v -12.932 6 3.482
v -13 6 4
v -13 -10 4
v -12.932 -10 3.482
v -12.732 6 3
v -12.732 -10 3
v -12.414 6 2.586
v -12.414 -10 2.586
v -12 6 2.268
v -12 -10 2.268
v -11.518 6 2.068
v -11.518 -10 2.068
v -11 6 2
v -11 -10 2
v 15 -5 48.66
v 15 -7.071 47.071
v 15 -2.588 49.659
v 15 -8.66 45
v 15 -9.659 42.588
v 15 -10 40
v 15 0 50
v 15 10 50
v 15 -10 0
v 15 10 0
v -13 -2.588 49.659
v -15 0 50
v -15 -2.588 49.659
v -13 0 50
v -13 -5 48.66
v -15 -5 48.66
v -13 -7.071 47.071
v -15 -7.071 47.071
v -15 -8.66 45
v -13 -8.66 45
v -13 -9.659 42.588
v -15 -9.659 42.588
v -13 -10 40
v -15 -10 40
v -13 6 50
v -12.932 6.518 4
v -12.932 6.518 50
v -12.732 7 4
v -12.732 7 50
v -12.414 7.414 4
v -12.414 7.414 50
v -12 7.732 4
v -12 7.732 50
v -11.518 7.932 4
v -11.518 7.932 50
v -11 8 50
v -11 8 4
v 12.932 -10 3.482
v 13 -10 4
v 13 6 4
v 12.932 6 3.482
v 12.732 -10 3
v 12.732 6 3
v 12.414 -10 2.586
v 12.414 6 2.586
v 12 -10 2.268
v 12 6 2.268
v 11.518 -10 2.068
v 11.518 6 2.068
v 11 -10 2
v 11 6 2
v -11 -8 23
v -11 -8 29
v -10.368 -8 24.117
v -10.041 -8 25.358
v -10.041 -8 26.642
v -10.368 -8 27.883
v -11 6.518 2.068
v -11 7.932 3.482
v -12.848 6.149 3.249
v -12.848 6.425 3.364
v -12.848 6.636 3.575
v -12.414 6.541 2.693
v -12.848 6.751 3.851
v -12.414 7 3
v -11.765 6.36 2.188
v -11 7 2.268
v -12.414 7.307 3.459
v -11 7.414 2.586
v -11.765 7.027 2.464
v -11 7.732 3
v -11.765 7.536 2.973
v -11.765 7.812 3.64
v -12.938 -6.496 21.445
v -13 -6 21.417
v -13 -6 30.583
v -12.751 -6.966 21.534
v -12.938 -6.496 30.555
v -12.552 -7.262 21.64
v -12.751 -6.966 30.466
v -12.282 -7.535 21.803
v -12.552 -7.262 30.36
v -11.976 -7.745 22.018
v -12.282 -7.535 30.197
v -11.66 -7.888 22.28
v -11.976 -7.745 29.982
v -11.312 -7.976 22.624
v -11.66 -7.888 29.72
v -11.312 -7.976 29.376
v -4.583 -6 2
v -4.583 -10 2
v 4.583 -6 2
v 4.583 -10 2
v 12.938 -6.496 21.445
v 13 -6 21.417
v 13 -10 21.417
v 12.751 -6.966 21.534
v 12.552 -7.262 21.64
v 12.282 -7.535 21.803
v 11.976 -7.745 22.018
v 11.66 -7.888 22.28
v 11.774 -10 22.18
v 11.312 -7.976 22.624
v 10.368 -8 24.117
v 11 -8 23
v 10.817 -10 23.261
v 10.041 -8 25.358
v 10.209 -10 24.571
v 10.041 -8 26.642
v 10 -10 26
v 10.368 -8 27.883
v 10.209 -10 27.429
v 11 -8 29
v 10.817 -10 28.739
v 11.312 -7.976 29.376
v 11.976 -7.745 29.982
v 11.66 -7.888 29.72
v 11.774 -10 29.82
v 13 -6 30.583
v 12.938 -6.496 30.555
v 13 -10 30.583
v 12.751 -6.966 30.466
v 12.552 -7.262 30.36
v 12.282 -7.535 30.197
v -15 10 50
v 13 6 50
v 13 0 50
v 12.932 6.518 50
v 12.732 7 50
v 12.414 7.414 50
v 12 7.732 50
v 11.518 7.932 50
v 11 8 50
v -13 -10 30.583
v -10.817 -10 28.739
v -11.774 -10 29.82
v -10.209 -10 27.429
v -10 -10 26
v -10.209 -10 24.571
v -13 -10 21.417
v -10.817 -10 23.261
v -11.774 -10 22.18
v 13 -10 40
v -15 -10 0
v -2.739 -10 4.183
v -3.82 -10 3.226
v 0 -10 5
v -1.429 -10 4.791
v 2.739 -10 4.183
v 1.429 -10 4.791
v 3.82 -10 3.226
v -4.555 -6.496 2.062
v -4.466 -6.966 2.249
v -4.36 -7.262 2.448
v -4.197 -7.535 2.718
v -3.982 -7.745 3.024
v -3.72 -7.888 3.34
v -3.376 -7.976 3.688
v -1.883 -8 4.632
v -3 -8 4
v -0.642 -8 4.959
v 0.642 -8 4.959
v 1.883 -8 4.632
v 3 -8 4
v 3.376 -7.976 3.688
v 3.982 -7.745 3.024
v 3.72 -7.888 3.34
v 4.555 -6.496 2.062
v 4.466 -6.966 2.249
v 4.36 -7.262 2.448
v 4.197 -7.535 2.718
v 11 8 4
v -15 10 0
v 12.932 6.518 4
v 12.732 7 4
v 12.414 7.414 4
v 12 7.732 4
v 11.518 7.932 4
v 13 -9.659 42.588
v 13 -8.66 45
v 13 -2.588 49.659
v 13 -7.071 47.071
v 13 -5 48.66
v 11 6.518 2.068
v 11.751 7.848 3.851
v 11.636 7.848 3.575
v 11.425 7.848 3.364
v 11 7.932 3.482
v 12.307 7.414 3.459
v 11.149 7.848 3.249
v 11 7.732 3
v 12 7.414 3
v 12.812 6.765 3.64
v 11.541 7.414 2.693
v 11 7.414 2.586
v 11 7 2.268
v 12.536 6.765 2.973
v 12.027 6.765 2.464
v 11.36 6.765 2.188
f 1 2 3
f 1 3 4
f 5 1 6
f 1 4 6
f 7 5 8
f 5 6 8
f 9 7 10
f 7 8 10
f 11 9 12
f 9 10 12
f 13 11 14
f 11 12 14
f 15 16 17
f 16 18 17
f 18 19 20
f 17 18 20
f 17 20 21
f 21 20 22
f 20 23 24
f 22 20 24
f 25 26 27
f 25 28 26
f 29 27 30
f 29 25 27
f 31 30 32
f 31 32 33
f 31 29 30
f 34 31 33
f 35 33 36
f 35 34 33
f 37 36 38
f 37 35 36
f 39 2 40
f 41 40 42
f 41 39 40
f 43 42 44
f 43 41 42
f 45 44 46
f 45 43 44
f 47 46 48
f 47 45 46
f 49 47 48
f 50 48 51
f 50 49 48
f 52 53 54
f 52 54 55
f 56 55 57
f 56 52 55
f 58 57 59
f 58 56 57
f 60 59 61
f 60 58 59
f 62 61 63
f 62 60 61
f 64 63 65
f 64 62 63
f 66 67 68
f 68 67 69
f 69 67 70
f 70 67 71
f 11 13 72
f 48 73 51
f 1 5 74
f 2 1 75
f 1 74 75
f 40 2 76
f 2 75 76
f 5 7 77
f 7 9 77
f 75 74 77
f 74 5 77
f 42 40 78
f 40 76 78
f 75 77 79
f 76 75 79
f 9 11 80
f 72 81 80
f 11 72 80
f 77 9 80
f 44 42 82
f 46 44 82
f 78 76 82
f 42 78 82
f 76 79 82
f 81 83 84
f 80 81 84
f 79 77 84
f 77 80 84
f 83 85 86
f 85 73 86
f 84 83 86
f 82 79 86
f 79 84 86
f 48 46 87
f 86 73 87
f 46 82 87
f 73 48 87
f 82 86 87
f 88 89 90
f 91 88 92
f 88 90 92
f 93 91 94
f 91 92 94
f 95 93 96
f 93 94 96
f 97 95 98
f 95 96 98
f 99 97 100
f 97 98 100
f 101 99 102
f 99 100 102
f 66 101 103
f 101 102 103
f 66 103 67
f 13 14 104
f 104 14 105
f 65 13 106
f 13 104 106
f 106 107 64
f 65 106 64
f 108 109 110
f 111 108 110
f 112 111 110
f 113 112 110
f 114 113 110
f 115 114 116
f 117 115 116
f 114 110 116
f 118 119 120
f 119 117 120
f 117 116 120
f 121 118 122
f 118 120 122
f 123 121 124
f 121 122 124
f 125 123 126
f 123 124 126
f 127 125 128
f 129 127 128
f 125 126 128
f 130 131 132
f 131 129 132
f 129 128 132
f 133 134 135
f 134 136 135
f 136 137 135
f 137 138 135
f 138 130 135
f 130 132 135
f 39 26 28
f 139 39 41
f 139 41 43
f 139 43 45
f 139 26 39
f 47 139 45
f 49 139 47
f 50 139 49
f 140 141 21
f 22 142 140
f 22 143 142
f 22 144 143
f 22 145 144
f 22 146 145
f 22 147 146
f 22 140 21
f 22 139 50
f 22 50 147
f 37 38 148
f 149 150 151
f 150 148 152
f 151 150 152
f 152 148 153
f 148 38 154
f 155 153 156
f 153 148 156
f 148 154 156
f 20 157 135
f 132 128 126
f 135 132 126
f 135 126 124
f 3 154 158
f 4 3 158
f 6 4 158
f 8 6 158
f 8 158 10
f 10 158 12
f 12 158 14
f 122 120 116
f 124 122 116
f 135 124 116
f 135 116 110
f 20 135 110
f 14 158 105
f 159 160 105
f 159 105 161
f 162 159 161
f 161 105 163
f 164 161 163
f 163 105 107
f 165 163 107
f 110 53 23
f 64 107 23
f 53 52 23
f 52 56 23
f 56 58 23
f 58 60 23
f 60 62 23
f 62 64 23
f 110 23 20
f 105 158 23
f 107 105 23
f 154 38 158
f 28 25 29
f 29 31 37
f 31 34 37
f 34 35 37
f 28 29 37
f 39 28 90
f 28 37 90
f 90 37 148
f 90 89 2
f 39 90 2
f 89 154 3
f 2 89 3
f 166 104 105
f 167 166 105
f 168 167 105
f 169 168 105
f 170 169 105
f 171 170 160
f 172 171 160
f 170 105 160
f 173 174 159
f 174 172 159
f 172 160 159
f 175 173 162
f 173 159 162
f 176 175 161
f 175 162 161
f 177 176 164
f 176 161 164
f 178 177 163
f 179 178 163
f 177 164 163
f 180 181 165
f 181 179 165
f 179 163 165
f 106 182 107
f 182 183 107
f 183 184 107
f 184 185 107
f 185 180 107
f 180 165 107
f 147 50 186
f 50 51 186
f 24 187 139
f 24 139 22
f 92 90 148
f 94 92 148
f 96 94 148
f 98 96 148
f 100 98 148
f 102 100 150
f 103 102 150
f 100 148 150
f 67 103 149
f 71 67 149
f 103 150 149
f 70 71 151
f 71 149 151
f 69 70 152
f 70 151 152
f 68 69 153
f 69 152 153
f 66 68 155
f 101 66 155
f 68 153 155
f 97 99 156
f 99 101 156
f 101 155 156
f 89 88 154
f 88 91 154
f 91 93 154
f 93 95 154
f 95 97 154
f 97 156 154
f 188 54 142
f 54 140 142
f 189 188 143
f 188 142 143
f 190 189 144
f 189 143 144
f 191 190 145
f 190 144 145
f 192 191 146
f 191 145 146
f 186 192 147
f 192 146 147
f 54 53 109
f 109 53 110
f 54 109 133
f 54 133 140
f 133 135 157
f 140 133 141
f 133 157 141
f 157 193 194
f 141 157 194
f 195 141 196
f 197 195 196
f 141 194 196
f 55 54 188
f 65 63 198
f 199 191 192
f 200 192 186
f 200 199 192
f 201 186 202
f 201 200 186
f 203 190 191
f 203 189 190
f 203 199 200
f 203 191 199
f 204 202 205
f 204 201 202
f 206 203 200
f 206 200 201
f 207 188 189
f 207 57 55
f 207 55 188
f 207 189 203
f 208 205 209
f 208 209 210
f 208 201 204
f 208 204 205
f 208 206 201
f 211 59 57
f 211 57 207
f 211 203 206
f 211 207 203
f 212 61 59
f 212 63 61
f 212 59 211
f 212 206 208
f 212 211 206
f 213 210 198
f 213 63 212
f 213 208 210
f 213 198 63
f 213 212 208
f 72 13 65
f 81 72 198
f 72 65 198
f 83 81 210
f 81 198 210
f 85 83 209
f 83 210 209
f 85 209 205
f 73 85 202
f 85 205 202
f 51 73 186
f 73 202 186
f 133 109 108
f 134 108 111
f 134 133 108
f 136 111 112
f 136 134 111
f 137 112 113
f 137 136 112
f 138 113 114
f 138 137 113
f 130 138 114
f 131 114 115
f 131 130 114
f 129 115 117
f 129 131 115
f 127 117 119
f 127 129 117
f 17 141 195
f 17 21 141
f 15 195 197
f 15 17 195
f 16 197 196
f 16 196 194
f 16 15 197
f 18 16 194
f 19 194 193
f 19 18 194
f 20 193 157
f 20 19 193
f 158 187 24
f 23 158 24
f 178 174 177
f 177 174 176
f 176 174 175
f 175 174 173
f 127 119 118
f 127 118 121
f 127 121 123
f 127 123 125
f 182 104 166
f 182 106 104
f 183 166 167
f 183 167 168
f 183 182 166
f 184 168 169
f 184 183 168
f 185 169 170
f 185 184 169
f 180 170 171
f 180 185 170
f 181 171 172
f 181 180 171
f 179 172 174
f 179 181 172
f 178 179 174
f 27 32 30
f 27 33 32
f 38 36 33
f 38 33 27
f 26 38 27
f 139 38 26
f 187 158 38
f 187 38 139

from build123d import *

# Parameters (mm, degrees)
F0_W     = 30
F0_H     = 20
F0_W_2   = 26
F0_H_2   = 16
F1_DEPTH = 50
F2_W     = 30
F2_H     = 20
F3_DEPTH = 2
F5_DEPTH = 2
F6_R     = 10
F7_R     = 2


with BuildPart() as f1:
    # F0 (on Top) → F1 (new body)
    with BuildSketch(Plane.XY):
        Rectangle(F0_W, F0_H)
        Rectangle(F0_W_2, F0_H_2, mode=Mode.SUBTRACT)
    extrude(amount=F1_DEPTH)

    # F2 (on Top) → F3 (join)
    with BuildSketch(Plane.XY):
        Rectangle(F2_W, F2_H)
    extrude(amount=F3_DEPTH)

    # F4 (on face) → F5 (cut, through all)
    with BuildSketch(Plane.XZ.offset(10)):
        with BuildLine():
            Line((13, 50), (-13, 50))
            Line((-13, 50), (-13, 30.582575695))
            ThreePointArc((-13, 30.582575695), (-10, 26), (-13, 21.417424305))
            Line((-13, 21.417424305), (-13, 2))
            Line((-13, 2), (-4.582575695, 2))
            ThreePointArc((-4.582575695, 2), (0, 5), (4.582575695, 2))
            Line((4.582575695, 2), (13, 2))
            Line((13, 2), (13, 21.417424305))
            ThreePointArc((13, 21.417424305), (10, 26), (13, 30.582575695))
            Line((13, 30.582575695), (13, 50))
        make_face()
    extrude(amount=-F5_DEPTH, mode=Mode.SUBTRACT)

    # F6
    f6_edges = [f1.edges().sort_by_distance(p)[0] for p in [
        (14, -10, 50),
        (-14, -10, 50),
    ]]
    fillet(f6_edges, radius=F6_R)

    # F7
    f7_edges = [f1.edges().sort_by_distance(p)[0] for p in [
        (13, -1, 2),
        (13, 8, 26),
        (0, 8, 2),
        (-13, -1, 2),
        (-13, 8, 26),
        (13, -8, 26),
        (-13, -8, 26),
        (0, -8, 2),
    ]]
    fillet(f7_edges, radius=F7_R)


solid = f1.part
